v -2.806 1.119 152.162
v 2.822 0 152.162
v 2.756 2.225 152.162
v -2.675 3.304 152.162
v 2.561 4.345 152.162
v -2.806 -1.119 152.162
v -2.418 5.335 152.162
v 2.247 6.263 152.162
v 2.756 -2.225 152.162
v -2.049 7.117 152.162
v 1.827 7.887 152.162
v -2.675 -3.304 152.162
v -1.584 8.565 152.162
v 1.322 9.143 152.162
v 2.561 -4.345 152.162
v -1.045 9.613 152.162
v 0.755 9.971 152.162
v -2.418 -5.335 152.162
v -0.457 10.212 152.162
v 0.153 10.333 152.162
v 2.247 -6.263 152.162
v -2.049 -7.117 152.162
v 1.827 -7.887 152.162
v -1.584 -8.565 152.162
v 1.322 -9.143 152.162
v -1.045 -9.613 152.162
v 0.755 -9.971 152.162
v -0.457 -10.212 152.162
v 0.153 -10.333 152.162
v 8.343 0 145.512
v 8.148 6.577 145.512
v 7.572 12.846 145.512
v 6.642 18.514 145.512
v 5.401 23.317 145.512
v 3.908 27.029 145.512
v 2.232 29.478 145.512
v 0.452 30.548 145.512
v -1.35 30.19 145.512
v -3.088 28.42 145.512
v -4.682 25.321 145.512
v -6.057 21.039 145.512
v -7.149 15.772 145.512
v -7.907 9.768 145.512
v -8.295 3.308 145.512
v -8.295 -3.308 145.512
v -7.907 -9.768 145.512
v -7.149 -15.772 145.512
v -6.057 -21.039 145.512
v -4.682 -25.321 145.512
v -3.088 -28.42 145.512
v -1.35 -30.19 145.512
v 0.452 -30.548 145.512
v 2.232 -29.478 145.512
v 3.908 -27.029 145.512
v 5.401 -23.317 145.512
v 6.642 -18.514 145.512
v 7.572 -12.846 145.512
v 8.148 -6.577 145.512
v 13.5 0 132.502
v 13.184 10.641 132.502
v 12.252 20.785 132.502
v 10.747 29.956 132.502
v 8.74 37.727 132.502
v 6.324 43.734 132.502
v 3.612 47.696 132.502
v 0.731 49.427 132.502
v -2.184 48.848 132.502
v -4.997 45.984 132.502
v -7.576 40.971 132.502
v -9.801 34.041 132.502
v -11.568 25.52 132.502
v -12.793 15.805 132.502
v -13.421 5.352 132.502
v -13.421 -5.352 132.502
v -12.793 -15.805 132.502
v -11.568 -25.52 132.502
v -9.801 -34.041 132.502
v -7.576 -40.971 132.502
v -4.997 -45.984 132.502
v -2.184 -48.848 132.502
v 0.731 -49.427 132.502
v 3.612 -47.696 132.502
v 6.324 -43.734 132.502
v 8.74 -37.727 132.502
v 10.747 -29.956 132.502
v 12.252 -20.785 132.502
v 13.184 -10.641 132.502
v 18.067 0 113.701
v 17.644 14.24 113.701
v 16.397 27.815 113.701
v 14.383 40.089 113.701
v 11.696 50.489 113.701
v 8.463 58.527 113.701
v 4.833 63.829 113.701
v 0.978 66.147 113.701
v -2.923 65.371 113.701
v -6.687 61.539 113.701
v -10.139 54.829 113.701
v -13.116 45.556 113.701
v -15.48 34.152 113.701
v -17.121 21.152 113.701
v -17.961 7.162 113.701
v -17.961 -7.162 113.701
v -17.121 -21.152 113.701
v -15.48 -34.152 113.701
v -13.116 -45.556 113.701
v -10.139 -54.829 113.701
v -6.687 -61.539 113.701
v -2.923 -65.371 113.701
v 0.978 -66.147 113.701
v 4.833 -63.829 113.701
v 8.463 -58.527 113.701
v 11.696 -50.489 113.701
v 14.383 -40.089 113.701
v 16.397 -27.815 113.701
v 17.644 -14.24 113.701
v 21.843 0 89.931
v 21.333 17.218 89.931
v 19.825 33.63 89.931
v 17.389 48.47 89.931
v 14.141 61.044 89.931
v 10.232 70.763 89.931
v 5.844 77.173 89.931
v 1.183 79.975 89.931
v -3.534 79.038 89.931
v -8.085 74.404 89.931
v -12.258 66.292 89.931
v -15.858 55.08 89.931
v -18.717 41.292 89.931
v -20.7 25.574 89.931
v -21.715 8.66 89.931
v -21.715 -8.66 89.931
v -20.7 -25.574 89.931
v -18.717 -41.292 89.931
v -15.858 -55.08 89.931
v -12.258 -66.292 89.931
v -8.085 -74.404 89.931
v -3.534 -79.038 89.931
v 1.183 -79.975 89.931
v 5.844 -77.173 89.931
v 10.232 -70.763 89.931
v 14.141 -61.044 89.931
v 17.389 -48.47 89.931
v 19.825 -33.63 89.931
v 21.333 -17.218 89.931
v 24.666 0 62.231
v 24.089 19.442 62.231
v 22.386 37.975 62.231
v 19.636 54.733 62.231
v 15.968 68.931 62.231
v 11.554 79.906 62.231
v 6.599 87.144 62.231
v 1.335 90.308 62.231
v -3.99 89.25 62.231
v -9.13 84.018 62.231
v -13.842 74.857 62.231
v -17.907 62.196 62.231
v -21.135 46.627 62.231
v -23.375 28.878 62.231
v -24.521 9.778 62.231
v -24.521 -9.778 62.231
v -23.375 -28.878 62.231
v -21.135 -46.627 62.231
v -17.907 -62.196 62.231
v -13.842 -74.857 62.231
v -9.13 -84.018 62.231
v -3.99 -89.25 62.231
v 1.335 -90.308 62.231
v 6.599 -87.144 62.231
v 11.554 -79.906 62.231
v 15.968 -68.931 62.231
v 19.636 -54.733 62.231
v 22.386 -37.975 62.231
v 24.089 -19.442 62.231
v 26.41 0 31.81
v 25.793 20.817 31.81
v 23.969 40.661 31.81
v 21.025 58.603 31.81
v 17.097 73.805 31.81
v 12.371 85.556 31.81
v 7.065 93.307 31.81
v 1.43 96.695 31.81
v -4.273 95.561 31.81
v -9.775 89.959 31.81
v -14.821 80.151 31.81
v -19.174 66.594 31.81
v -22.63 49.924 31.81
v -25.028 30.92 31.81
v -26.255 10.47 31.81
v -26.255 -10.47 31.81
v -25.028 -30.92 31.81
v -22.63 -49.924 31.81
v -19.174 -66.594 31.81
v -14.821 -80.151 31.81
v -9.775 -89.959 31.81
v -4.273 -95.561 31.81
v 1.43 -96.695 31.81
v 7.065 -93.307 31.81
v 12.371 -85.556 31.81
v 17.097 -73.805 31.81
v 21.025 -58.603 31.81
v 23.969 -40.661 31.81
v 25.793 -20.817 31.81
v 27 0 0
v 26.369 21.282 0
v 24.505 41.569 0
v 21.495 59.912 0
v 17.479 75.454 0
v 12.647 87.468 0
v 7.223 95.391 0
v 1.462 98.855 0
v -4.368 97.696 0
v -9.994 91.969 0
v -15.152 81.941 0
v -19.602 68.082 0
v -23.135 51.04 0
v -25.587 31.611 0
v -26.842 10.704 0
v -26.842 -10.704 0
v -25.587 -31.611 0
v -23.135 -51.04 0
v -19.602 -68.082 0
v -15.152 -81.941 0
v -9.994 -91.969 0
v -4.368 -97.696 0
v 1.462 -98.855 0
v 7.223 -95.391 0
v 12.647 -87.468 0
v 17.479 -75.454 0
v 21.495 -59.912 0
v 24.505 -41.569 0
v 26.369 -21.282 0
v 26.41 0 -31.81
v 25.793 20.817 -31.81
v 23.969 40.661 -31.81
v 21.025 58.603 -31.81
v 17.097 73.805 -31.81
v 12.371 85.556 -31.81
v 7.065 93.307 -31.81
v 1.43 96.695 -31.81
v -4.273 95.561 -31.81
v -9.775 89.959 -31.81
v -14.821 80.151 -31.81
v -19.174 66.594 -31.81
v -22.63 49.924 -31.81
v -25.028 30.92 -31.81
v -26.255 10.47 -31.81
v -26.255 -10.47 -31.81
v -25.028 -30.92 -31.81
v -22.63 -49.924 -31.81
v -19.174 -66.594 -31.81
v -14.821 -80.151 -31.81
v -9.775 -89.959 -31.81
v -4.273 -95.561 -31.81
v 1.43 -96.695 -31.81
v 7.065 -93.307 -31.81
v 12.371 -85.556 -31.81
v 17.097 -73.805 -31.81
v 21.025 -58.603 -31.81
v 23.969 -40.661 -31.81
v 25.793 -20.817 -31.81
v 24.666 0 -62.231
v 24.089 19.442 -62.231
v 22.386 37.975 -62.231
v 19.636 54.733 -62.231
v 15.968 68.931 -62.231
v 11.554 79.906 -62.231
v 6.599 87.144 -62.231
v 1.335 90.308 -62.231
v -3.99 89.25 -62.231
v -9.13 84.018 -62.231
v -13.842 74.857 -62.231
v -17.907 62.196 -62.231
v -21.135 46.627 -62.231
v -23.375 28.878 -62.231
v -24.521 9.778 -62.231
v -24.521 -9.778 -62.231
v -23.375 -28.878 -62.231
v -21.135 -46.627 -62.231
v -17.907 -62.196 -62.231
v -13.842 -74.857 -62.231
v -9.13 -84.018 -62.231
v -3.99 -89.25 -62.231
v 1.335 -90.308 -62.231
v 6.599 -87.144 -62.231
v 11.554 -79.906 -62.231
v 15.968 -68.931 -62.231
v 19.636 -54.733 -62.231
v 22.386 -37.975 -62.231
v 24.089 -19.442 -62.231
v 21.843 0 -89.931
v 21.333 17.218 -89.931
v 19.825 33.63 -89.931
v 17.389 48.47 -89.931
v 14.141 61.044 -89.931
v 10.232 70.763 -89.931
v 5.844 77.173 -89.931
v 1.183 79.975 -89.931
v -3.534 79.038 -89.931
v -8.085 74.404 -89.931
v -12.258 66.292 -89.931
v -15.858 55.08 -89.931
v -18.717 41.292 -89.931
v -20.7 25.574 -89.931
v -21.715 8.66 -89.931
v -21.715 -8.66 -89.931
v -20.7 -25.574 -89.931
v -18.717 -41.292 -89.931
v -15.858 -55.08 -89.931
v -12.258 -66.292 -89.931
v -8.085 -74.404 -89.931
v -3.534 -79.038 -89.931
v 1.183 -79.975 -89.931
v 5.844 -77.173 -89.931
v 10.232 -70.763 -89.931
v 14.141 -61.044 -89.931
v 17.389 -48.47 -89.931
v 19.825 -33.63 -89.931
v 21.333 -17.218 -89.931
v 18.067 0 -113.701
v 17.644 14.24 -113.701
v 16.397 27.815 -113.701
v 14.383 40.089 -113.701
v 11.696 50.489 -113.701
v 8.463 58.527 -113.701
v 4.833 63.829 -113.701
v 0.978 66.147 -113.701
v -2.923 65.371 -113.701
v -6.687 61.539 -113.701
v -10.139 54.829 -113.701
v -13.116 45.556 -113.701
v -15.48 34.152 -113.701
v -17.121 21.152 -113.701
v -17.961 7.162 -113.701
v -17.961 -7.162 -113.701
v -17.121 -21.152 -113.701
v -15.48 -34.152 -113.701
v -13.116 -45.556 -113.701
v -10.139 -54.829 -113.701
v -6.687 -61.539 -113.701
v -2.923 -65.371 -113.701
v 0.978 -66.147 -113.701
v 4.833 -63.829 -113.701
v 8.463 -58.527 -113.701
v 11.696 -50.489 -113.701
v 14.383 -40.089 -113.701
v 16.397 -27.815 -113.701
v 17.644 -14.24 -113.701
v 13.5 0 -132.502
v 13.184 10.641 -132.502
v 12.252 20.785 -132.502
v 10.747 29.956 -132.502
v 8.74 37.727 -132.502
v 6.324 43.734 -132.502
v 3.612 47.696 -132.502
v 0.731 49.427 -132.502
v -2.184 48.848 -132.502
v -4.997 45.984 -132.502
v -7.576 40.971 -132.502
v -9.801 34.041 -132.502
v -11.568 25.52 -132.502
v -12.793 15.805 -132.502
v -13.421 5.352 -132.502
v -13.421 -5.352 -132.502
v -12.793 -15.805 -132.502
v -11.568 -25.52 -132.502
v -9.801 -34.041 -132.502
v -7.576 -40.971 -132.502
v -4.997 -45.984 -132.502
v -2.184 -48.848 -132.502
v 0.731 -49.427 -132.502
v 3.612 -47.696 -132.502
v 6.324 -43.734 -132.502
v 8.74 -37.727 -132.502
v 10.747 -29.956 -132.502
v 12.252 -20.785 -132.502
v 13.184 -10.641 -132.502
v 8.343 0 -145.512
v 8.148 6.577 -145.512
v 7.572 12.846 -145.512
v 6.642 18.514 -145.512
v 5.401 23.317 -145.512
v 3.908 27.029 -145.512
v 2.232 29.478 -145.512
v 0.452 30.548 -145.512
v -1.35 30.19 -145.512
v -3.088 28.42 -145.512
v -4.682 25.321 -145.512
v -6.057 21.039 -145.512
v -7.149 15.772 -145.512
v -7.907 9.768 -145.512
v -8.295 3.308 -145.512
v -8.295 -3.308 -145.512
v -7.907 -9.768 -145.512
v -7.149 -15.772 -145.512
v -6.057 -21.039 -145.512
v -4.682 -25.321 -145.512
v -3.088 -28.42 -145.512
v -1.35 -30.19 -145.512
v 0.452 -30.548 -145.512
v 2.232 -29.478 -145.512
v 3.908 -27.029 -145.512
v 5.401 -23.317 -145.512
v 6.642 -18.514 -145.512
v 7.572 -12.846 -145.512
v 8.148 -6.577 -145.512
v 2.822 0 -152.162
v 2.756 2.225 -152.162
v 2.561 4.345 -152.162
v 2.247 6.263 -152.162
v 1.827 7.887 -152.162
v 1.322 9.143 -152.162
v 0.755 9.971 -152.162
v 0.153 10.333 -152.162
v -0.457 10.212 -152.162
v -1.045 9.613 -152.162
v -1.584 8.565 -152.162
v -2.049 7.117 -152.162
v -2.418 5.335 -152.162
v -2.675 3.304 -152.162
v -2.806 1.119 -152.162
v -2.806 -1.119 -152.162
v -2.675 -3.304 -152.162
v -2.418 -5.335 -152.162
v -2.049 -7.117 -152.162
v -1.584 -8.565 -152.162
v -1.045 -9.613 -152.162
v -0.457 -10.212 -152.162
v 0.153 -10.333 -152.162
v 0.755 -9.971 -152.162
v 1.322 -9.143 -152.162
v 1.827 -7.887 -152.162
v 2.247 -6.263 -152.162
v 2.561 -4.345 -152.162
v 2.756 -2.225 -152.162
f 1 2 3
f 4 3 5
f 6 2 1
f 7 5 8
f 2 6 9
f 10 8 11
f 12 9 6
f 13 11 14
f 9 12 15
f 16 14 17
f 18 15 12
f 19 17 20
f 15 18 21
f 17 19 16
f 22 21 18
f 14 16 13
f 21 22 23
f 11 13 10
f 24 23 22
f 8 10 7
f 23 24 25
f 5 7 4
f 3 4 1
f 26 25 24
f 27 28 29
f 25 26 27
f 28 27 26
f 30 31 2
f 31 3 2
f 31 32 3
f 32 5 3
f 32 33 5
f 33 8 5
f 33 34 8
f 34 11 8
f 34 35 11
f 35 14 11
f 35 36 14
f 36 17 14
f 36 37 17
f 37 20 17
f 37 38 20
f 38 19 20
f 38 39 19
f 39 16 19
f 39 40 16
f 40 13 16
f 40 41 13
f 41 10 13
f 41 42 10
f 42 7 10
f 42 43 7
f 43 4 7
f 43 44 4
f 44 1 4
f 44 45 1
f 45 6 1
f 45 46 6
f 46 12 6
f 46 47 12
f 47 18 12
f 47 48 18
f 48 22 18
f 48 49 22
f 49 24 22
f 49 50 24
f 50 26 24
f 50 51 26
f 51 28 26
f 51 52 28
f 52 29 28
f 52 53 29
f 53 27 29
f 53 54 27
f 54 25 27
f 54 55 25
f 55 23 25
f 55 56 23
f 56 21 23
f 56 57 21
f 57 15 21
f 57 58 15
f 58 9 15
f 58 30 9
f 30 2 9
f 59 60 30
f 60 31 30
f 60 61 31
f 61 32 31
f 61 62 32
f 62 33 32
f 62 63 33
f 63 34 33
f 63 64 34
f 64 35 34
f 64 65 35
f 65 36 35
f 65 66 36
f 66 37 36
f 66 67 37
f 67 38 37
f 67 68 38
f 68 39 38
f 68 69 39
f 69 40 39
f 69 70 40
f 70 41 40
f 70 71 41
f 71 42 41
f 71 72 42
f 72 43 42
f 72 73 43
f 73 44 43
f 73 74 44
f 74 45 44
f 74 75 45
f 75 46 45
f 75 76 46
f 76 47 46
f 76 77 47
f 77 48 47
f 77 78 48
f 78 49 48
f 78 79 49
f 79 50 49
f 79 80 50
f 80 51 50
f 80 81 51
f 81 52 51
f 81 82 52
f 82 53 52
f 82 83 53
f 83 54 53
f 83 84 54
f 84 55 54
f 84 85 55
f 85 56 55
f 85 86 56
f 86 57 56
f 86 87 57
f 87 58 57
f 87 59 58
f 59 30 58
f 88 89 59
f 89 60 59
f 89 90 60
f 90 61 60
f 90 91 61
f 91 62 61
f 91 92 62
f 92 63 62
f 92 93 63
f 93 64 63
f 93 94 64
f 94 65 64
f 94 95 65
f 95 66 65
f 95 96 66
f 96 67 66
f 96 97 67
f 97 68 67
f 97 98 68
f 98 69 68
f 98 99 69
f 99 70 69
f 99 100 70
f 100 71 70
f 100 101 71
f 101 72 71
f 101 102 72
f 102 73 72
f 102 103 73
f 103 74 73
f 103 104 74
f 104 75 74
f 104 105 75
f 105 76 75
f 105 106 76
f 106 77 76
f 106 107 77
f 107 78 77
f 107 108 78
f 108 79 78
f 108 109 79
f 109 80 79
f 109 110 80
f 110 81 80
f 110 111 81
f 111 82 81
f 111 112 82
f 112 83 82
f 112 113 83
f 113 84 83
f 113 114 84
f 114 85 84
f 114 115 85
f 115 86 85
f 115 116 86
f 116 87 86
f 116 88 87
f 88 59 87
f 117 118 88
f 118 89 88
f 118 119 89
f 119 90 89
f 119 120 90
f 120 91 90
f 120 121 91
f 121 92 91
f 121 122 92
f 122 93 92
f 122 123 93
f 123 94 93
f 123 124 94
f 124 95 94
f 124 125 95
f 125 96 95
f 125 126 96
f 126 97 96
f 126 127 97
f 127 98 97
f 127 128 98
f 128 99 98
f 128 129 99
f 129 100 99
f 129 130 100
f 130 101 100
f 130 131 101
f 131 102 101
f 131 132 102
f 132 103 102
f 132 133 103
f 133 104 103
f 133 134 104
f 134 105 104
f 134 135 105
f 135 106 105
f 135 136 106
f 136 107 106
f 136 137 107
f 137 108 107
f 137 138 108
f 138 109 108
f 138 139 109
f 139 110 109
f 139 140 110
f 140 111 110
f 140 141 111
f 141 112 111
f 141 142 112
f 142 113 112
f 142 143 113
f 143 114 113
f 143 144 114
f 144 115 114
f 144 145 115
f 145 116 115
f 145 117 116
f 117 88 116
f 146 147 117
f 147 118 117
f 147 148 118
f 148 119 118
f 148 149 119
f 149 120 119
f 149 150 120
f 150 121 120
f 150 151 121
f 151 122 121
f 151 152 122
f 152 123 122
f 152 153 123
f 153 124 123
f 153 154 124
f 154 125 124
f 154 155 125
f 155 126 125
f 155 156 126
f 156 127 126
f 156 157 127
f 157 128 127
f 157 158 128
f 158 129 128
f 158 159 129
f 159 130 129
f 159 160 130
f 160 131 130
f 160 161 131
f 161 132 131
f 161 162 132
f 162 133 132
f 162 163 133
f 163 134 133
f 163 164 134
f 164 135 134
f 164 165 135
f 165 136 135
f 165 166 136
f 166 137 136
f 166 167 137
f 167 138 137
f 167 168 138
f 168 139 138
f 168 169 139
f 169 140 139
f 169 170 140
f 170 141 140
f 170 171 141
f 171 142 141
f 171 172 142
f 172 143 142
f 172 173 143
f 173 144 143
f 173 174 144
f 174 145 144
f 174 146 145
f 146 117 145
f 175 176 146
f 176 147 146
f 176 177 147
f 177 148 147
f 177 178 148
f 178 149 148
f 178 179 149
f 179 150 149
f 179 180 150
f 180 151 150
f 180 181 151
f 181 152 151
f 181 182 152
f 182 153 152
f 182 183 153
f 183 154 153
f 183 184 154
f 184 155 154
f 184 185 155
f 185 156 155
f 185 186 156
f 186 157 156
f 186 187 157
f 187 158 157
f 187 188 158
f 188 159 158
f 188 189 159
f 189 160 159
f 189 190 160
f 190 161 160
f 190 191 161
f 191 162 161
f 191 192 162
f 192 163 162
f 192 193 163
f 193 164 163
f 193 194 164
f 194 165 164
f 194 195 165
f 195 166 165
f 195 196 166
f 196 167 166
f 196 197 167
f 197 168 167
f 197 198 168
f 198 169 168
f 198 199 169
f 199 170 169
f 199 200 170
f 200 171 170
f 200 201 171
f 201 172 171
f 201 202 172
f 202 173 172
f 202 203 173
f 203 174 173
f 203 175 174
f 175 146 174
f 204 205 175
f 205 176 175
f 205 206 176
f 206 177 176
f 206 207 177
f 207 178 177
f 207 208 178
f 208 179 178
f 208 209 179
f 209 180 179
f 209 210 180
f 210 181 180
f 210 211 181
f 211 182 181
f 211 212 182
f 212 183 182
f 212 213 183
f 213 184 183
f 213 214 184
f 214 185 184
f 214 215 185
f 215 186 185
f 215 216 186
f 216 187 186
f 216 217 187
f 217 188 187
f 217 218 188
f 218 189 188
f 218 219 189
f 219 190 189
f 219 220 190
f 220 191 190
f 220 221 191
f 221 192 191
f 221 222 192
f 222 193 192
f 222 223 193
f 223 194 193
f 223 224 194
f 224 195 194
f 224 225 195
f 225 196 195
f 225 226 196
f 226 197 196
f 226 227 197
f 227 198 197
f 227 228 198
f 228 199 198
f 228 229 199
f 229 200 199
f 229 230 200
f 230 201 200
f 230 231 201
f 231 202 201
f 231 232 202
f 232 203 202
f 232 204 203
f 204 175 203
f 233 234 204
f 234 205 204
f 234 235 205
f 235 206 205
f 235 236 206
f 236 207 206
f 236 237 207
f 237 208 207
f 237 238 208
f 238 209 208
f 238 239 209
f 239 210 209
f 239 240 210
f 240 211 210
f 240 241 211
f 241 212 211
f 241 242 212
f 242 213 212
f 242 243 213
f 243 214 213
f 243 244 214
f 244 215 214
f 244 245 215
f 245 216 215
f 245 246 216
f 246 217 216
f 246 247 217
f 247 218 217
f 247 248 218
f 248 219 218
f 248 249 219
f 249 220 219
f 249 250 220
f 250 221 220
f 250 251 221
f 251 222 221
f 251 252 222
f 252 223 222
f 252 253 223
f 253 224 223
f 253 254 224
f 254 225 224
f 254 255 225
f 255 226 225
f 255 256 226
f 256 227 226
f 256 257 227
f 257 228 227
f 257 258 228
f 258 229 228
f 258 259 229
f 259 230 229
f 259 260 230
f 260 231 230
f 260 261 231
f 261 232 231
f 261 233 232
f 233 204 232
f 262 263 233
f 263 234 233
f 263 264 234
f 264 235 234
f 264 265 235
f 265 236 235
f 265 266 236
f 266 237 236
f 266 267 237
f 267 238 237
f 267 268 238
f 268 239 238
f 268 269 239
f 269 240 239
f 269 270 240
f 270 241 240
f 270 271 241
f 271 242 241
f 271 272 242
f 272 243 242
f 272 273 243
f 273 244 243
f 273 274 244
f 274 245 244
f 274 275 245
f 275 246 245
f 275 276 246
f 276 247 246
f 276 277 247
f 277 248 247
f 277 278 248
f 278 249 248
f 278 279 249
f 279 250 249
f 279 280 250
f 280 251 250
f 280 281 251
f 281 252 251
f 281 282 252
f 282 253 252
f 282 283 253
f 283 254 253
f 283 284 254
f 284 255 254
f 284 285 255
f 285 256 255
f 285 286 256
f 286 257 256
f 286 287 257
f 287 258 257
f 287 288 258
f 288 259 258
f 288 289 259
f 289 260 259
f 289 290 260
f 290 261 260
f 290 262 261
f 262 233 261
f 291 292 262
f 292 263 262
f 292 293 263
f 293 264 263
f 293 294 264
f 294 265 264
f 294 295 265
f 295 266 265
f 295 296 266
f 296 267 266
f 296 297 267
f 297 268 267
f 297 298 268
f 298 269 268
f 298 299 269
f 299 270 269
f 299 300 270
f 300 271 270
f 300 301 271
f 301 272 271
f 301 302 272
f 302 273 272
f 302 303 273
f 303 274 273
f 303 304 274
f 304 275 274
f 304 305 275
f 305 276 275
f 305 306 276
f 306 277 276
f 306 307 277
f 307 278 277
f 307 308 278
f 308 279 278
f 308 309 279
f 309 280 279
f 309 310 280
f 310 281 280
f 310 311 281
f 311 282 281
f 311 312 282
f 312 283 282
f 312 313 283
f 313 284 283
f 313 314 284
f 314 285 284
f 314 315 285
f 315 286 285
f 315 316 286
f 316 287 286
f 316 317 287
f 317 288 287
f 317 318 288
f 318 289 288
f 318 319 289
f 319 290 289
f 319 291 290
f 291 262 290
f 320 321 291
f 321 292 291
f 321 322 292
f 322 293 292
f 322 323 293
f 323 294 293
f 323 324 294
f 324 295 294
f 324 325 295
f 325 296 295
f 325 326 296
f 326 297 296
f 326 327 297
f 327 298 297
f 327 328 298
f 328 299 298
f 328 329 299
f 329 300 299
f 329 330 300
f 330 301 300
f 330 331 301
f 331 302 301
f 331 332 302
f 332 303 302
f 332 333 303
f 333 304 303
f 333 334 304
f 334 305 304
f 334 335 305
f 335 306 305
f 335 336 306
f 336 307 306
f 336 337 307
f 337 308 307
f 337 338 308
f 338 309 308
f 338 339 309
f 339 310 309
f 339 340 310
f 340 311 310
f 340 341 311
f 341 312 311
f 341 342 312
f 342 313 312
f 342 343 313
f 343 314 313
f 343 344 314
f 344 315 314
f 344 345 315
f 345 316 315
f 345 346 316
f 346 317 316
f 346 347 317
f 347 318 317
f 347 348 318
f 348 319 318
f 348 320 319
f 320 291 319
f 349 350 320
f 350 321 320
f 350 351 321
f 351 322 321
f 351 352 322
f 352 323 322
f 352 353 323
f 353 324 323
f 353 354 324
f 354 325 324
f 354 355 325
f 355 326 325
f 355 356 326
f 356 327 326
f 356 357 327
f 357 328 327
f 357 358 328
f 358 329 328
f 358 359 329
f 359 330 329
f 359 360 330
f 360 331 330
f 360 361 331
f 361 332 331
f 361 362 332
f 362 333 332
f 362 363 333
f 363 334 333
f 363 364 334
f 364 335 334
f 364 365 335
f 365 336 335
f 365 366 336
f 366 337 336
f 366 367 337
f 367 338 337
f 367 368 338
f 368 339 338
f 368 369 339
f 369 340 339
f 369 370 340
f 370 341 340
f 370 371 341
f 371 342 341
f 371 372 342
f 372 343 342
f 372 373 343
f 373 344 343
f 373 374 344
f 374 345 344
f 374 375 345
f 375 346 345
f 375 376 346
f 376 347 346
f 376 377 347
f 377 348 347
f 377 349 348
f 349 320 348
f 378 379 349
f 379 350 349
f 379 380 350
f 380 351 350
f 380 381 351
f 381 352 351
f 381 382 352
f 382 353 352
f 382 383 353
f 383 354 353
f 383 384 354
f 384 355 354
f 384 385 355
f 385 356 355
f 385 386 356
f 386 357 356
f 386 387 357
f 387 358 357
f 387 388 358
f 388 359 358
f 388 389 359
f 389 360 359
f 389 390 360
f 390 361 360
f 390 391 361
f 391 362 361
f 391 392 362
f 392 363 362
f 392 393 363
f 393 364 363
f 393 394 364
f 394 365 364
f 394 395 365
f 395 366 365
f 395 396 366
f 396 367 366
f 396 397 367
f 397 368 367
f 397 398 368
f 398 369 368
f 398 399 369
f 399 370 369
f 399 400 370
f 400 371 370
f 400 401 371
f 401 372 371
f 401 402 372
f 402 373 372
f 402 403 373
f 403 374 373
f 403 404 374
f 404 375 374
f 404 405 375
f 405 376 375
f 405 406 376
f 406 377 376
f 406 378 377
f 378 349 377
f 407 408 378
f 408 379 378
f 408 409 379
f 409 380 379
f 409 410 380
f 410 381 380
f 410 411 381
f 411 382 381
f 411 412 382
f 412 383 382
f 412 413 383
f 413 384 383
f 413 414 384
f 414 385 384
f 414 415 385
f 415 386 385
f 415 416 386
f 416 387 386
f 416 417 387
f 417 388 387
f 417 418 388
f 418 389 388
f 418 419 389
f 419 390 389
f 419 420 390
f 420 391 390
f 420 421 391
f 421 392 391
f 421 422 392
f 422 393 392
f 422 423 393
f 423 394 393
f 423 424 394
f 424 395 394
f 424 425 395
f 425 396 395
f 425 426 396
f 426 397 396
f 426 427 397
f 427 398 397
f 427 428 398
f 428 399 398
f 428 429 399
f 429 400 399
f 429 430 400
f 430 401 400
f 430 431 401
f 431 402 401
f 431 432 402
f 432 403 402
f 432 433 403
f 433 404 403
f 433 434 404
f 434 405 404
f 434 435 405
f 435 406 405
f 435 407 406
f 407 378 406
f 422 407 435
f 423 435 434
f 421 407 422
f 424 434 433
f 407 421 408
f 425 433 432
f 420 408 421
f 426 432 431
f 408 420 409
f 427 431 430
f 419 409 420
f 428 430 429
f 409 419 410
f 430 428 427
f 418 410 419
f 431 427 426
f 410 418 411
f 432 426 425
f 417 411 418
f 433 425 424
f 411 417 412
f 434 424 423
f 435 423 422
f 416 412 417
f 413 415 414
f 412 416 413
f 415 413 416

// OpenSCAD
// Generated by SolidPython 1.0.1 on 2020-07-29 00:46:45


scale(v = [3, 11, 17]) {
	sphere(r = 9);
}
/***********************************************
*********      SolidPython code:      **********
************************************************
 
# import packages: SolidPython
from solid import *
from solid.utils import *
from itertools import chain, combinations, permutations


class Resize:

    def __init__(self, scad_file):
        self.scad_file = scad_file
        #self.scad_file = import_scad(scad_file)
        # cone/cylinder param:
        self.r1 = 0
        self.r2 = 0
        self.h = 0
        # rectangular prism param:
        self.w = 0
        self.l = 0
        # ellipse param:
        self.r = 0

    # import OpenScad code (file name corresponds to shape)


    # classify shape + parameters
    def assign(self, param1, param2, param3):
        if self.scad_file == 'cone.scad':
            self.r1 = param1
            self.r2 = param2
            self.h = param3
        elif self.scad_file == 'cylinder.scad':
            self.r1 = param1
            self.r2 = param2
            self.h = param3
        elif self.scad_file == 'rectangularPrism.scad':
            self.h = param1
            self.l = param2
            self.w = param3
        else:
            self.r = param1
            self.h = param2

    # resize parameters
    def iterate(self):
        x = range(3, 20, 2)
        i = 1
        if self.scad_file == 'cone.scad':
            tempList = list(permutations(x, 2))
            for temp in tempList:
                param1 = temp[0]
                param2 = temp[1]
                filepath = 'produced_scad_files/' + 'cone' + str(param1) + '_' + str(param2) + '_' + '.scad'
                scad_render_to_file(cylinder(h=param1, r1=param2, r2=0), filepath)

        elif self.scad_file == 'cylinder.scad':
            tempList = list(permutations(x, 3))
            for temp in tempList:
                param1 = temp[0]
                param2 = temp[1]
                filepath = 'produced_scad_files/' + 'cylinder' + str(param1) + '_' + str(param2) + '_' + '.scad'
                scad_render_to_file(cylinder(h=param1, r1=param2, r2=param2), filepath)

        elif self.scad_file == 'rectangularPrism.scad':
            tempList = list(permutations(x, 3))
            for temp in tempList:
                param1 = temp[0]
                param2 = temp[1]
                param3 = temp[2]
                filepath = 'produced_scad_files/' + 'rectangularPrism' + str(param1) + '_' + str(param2) + '_' + str(
                    param3) + '.scad'
                scad_render_to_file(cube(size=(param1, param2, param3)), filepath)

        elif self.scad_file == 'ellipse.scad':
            tempList = list(permutations(x, 4))
            for temp in tempList:
                param1 = temp[0]
                param2 = temp[1]
                param3 = temp[2]
                param4 = temp[3]
                filepath = 'produced_scad_files/' + 'ellipse' + str(param1) + '_' + str(param2) + '_' + str(param3) + '_' + str(param4) + '.scad'
                scad_render_to_file(scale([param1, param2, param3])(sphere(r=param4)), filepath)

    def render_to_scadfile(self):
        scad_render_to_file(scad, 'example.scad') 
 
************************************************/
